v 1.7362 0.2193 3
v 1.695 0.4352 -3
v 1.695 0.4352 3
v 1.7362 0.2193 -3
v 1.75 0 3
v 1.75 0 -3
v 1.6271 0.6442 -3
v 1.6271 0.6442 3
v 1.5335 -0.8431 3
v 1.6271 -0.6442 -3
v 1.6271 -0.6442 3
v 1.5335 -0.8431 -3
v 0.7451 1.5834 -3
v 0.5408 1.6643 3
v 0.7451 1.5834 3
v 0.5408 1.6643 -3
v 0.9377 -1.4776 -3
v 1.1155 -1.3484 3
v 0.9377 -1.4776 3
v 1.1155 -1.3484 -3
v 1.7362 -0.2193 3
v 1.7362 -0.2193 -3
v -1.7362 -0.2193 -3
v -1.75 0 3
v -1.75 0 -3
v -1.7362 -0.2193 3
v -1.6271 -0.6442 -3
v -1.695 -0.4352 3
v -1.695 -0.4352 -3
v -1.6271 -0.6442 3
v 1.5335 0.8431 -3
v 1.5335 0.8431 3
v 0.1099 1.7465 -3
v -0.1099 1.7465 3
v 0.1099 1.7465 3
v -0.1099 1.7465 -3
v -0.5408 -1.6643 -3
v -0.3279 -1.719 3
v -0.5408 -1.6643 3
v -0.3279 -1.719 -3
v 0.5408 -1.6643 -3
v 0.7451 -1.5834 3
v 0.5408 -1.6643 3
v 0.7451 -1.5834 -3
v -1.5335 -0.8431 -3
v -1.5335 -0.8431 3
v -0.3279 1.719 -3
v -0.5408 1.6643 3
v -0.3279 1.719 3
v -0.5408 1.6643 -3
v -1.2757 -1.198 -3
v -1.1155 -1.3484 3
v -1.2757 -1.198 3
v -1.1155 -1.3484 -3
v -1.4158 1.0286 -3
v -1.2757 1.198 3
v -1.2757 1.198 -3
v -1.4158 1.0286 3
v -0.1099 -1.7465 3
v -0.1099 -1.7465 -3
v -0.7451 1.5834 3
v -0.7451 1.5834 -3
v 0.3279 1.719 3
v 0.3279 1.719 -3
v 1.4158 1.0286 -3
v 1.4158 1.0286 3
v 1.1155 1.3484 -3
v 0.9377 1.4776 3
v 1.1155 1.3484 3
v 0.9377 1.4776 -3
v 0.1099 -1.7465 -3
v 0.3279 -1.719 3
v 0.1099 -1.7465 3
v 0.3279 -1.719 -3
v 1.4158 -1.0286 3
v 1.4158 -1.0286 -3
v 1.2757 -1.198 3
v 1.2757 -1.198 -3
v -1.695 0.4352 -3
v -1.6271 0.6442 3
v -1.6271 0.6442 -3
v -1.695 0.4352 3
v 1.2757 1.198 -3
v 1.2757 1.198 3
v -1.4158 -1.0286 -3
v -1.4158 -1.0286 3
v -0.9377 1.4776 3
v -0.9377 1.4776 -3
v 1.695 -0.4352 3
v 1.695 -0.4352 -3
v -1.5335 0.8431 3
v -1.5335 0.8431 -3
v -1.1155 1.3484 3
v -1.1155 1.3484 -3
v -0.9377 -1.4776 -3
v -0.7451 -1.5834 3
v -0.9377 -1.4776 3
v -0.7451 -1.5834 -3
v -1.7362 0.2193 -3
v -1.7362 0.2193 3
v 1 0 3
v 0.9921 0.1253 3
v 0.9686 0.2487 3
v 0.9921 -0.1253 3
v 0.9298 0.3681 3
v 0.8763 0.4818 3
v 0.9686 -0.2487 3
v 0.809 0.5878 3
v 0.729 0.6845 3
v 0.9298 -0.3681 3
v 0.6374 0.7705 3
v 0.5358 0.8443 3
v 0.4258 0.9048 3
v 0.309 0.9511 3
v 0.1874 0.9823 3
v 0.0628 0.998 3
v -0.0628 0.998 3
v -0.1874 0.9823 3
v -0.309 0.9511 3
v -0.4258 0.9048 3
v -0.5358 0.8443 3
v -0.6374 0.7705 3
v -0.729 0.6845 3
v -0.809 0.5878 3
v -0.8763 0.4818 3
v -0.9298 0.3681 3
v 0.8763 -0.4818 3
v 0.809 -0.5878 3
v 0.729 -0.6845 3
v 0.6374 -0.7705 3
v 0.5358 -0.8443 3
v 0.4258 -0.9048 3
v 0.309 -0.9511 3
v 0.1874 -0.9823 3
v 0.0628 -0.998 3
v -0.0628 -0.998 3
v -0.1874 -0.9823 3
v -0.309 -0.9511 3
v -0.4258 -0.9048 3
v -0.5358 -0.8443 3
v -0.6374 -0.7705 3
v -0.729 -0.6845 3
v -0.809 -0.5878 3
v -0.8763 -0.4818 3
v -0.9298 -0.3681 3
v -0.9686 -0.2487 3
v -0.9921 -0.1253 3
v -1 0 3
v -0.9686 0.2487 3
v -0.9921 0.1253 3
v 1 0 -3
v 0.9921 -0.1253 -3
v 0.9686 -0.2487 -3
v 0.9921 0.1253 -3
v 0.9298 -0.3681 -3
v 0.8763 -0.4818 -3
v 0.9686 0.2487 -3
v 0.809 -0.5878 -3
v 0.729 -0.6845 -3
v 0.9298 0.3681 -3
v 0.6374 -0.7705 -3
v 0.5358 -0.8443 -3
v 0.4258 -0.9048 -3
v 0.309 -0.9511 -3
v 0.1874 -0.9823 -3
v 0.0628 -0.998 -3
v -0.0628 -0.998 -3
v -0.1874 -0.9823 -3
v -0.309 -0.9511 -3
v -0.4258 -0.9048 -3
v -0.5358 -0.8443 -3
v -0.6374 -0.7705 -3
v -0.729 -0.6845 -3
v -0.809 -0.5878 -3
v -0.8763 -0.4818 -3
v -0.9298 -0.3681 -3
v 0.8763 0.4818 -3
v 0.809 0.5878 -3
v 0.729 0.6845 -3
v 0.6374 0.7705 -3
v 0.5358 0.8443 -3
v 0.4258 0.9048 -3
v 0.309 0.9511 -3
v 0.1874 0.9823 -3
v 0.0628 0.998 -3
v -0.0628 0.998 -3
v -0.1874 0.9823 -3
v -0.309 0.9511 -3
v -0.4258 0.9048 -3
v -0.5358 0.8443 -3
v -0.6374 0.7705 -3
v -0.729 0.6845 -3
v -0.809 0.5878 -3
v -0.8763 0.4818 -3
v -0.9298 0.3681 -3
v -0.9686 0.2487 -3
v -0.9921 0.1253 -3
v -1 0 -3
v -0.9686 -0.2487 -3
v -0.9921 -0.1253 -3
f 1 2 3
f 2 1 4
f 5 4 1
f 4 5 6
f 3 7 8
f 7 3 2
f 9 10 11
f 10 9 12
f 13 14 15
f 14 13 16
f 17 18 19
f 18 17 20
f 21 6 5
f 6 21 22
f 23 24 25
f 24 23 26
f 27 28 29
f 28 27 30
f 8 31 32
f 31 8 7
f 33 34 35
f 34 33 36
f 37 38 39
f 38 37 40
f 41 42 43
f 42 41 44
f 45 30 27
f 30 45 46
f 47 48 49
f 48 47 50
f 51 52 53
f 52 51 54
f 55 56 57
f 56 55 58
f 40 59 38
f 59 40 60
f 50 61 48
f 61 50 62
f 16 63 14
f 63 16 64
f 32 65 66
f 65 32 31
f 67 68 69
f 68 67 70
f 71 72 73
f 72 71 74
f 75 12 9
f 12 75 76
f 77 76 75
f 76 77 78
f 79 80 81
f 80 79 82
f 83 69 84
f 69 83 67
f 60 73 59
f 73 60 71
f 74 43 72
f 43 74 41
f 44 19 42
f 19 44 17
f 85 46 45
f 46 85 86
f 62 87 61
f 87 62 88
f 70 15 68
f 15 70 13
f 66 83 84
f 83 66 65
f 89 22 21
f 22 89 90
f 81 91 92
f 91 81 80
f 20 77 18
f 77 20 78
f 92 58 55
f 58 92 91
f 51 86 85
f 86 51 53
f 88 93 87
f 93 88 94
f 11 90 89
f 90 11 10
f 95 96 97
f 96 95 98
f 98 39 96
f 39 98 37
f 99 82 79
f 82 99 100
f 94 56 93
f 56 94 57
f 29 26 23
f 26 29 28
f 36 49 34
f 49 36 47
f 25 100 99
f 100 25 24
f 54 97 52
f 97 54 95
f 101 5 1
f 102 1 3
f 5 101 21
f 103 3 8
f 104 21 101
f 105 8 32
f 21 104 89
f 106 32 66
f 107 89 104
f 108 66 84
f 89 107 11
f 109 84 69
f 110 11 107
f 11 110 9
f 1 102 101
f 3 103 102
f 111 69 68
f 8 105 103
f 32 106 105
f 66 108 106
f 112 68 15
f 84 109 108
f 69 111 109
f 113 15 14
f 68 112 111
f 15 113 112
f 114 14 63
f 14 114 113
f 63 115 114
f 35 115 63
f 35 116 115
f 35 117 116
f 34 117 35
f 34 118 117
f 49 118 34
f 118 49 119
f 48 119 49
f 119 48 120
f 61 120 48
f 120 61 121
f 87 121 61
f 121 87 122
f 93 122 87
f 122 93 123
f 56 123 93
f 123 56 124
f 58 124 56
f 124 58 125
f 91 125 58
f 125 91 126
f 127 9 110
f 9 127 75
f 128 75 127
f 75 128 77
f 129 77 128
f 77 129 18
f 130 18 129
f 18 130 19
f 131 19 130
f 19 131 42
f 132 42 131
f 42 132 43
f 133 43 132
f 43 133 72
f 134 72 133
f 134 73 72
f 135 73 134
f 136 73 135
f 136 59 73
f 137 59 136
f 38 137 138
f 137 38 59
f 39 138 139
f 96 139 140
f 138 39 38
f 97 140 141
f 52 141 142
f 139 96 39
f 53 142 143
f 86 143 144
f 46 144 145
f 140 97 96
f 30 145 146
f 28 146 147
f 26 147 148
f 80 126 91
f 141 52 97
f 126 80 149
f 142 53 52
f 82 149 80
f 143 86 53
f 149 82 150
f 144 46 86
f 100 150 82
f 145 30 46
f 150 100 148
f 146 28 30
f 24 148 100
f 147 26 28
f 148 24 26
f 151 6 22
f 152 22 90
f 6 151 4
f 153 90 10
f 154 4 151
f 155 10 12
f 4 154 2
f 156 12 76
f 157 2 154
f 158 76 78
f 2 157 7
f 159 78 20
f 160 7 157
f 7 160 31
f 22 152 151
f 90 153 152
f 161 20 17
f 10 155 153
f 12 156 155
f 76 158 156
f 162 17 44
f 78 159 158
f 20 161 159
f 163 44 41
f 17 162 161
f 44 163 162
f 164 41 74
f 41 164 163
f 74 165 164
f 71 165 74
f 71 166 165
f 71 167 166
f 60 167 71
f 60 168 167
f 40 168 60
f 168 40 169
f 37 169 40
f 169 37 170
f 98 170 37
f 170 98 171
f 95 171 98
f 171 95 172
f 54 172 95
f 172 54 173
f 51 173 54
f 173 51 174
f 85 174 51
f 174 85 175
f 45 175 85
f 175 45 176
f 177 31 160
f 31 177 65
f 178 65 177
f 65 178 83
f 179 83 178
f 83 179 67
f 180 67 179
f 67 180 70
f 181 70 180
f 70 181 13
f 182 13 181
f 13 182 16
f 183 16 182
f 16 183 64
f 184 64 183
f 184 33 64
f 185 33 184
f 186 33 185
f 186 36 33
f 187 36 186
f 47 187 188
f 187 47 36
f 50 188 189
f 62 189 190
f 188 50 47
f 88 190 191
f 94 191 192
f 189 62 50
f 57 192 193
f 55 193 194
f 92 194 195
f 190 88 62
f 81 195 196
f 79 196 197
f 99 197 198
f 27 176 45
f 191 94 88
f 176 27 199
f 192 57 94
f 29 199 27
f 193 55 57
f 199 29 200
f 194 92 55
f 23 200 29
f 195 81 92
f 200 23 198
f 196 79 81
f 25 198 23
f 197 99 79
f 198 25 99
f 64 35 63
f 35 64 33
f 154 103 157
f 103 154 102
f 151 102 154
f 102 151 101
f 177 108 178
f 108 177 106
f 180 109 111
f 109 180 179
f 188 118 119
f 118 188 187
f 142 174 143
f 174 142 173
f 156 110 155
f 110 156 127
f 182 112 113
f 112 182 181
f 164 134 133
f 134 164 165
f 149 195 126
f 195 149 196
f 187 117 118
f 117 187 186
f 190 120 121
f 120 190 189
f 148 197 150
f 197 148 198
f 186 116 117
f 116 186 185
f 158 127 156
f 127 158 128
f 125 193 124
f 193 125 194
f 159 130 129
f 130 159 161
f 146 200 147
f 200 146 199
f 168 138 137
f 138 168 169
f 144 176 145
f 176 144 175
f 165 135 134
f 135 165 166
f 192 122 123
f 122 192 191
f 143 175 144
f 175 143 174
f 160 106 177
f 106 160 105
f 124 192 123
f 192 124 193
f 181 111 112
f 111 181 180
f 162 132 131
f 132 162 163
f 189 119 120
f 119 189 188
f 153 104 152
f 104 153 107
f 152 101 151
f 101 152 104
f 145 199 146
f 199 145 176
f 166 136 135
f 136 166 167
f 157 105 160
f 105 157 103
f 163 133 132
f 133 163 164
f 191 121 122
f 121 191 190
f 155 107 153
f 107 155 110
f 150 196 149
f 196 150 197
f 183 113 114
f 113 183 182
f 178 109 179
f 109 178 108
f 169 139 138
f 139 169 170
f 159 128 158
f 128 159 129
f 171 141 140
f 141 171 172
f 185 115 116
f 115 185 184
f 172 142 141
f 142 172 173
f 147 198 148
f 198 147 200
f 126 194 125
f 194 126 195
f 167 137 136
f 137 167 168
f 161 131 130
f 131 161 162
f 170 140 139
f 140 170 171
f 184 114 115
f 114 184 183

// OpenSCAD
$fn = 50;


difference() {
	union() {
		translate(v = [0, 0, -3.0000000000]) {
			cylinder(h = 6, r = 1.7500000000);
		}
	}
	union() {
		translate(v = [0, 0, -100.0000000000]) {
			cylinder(h = 200, r = 1.0000000000);
		}
	}
}
